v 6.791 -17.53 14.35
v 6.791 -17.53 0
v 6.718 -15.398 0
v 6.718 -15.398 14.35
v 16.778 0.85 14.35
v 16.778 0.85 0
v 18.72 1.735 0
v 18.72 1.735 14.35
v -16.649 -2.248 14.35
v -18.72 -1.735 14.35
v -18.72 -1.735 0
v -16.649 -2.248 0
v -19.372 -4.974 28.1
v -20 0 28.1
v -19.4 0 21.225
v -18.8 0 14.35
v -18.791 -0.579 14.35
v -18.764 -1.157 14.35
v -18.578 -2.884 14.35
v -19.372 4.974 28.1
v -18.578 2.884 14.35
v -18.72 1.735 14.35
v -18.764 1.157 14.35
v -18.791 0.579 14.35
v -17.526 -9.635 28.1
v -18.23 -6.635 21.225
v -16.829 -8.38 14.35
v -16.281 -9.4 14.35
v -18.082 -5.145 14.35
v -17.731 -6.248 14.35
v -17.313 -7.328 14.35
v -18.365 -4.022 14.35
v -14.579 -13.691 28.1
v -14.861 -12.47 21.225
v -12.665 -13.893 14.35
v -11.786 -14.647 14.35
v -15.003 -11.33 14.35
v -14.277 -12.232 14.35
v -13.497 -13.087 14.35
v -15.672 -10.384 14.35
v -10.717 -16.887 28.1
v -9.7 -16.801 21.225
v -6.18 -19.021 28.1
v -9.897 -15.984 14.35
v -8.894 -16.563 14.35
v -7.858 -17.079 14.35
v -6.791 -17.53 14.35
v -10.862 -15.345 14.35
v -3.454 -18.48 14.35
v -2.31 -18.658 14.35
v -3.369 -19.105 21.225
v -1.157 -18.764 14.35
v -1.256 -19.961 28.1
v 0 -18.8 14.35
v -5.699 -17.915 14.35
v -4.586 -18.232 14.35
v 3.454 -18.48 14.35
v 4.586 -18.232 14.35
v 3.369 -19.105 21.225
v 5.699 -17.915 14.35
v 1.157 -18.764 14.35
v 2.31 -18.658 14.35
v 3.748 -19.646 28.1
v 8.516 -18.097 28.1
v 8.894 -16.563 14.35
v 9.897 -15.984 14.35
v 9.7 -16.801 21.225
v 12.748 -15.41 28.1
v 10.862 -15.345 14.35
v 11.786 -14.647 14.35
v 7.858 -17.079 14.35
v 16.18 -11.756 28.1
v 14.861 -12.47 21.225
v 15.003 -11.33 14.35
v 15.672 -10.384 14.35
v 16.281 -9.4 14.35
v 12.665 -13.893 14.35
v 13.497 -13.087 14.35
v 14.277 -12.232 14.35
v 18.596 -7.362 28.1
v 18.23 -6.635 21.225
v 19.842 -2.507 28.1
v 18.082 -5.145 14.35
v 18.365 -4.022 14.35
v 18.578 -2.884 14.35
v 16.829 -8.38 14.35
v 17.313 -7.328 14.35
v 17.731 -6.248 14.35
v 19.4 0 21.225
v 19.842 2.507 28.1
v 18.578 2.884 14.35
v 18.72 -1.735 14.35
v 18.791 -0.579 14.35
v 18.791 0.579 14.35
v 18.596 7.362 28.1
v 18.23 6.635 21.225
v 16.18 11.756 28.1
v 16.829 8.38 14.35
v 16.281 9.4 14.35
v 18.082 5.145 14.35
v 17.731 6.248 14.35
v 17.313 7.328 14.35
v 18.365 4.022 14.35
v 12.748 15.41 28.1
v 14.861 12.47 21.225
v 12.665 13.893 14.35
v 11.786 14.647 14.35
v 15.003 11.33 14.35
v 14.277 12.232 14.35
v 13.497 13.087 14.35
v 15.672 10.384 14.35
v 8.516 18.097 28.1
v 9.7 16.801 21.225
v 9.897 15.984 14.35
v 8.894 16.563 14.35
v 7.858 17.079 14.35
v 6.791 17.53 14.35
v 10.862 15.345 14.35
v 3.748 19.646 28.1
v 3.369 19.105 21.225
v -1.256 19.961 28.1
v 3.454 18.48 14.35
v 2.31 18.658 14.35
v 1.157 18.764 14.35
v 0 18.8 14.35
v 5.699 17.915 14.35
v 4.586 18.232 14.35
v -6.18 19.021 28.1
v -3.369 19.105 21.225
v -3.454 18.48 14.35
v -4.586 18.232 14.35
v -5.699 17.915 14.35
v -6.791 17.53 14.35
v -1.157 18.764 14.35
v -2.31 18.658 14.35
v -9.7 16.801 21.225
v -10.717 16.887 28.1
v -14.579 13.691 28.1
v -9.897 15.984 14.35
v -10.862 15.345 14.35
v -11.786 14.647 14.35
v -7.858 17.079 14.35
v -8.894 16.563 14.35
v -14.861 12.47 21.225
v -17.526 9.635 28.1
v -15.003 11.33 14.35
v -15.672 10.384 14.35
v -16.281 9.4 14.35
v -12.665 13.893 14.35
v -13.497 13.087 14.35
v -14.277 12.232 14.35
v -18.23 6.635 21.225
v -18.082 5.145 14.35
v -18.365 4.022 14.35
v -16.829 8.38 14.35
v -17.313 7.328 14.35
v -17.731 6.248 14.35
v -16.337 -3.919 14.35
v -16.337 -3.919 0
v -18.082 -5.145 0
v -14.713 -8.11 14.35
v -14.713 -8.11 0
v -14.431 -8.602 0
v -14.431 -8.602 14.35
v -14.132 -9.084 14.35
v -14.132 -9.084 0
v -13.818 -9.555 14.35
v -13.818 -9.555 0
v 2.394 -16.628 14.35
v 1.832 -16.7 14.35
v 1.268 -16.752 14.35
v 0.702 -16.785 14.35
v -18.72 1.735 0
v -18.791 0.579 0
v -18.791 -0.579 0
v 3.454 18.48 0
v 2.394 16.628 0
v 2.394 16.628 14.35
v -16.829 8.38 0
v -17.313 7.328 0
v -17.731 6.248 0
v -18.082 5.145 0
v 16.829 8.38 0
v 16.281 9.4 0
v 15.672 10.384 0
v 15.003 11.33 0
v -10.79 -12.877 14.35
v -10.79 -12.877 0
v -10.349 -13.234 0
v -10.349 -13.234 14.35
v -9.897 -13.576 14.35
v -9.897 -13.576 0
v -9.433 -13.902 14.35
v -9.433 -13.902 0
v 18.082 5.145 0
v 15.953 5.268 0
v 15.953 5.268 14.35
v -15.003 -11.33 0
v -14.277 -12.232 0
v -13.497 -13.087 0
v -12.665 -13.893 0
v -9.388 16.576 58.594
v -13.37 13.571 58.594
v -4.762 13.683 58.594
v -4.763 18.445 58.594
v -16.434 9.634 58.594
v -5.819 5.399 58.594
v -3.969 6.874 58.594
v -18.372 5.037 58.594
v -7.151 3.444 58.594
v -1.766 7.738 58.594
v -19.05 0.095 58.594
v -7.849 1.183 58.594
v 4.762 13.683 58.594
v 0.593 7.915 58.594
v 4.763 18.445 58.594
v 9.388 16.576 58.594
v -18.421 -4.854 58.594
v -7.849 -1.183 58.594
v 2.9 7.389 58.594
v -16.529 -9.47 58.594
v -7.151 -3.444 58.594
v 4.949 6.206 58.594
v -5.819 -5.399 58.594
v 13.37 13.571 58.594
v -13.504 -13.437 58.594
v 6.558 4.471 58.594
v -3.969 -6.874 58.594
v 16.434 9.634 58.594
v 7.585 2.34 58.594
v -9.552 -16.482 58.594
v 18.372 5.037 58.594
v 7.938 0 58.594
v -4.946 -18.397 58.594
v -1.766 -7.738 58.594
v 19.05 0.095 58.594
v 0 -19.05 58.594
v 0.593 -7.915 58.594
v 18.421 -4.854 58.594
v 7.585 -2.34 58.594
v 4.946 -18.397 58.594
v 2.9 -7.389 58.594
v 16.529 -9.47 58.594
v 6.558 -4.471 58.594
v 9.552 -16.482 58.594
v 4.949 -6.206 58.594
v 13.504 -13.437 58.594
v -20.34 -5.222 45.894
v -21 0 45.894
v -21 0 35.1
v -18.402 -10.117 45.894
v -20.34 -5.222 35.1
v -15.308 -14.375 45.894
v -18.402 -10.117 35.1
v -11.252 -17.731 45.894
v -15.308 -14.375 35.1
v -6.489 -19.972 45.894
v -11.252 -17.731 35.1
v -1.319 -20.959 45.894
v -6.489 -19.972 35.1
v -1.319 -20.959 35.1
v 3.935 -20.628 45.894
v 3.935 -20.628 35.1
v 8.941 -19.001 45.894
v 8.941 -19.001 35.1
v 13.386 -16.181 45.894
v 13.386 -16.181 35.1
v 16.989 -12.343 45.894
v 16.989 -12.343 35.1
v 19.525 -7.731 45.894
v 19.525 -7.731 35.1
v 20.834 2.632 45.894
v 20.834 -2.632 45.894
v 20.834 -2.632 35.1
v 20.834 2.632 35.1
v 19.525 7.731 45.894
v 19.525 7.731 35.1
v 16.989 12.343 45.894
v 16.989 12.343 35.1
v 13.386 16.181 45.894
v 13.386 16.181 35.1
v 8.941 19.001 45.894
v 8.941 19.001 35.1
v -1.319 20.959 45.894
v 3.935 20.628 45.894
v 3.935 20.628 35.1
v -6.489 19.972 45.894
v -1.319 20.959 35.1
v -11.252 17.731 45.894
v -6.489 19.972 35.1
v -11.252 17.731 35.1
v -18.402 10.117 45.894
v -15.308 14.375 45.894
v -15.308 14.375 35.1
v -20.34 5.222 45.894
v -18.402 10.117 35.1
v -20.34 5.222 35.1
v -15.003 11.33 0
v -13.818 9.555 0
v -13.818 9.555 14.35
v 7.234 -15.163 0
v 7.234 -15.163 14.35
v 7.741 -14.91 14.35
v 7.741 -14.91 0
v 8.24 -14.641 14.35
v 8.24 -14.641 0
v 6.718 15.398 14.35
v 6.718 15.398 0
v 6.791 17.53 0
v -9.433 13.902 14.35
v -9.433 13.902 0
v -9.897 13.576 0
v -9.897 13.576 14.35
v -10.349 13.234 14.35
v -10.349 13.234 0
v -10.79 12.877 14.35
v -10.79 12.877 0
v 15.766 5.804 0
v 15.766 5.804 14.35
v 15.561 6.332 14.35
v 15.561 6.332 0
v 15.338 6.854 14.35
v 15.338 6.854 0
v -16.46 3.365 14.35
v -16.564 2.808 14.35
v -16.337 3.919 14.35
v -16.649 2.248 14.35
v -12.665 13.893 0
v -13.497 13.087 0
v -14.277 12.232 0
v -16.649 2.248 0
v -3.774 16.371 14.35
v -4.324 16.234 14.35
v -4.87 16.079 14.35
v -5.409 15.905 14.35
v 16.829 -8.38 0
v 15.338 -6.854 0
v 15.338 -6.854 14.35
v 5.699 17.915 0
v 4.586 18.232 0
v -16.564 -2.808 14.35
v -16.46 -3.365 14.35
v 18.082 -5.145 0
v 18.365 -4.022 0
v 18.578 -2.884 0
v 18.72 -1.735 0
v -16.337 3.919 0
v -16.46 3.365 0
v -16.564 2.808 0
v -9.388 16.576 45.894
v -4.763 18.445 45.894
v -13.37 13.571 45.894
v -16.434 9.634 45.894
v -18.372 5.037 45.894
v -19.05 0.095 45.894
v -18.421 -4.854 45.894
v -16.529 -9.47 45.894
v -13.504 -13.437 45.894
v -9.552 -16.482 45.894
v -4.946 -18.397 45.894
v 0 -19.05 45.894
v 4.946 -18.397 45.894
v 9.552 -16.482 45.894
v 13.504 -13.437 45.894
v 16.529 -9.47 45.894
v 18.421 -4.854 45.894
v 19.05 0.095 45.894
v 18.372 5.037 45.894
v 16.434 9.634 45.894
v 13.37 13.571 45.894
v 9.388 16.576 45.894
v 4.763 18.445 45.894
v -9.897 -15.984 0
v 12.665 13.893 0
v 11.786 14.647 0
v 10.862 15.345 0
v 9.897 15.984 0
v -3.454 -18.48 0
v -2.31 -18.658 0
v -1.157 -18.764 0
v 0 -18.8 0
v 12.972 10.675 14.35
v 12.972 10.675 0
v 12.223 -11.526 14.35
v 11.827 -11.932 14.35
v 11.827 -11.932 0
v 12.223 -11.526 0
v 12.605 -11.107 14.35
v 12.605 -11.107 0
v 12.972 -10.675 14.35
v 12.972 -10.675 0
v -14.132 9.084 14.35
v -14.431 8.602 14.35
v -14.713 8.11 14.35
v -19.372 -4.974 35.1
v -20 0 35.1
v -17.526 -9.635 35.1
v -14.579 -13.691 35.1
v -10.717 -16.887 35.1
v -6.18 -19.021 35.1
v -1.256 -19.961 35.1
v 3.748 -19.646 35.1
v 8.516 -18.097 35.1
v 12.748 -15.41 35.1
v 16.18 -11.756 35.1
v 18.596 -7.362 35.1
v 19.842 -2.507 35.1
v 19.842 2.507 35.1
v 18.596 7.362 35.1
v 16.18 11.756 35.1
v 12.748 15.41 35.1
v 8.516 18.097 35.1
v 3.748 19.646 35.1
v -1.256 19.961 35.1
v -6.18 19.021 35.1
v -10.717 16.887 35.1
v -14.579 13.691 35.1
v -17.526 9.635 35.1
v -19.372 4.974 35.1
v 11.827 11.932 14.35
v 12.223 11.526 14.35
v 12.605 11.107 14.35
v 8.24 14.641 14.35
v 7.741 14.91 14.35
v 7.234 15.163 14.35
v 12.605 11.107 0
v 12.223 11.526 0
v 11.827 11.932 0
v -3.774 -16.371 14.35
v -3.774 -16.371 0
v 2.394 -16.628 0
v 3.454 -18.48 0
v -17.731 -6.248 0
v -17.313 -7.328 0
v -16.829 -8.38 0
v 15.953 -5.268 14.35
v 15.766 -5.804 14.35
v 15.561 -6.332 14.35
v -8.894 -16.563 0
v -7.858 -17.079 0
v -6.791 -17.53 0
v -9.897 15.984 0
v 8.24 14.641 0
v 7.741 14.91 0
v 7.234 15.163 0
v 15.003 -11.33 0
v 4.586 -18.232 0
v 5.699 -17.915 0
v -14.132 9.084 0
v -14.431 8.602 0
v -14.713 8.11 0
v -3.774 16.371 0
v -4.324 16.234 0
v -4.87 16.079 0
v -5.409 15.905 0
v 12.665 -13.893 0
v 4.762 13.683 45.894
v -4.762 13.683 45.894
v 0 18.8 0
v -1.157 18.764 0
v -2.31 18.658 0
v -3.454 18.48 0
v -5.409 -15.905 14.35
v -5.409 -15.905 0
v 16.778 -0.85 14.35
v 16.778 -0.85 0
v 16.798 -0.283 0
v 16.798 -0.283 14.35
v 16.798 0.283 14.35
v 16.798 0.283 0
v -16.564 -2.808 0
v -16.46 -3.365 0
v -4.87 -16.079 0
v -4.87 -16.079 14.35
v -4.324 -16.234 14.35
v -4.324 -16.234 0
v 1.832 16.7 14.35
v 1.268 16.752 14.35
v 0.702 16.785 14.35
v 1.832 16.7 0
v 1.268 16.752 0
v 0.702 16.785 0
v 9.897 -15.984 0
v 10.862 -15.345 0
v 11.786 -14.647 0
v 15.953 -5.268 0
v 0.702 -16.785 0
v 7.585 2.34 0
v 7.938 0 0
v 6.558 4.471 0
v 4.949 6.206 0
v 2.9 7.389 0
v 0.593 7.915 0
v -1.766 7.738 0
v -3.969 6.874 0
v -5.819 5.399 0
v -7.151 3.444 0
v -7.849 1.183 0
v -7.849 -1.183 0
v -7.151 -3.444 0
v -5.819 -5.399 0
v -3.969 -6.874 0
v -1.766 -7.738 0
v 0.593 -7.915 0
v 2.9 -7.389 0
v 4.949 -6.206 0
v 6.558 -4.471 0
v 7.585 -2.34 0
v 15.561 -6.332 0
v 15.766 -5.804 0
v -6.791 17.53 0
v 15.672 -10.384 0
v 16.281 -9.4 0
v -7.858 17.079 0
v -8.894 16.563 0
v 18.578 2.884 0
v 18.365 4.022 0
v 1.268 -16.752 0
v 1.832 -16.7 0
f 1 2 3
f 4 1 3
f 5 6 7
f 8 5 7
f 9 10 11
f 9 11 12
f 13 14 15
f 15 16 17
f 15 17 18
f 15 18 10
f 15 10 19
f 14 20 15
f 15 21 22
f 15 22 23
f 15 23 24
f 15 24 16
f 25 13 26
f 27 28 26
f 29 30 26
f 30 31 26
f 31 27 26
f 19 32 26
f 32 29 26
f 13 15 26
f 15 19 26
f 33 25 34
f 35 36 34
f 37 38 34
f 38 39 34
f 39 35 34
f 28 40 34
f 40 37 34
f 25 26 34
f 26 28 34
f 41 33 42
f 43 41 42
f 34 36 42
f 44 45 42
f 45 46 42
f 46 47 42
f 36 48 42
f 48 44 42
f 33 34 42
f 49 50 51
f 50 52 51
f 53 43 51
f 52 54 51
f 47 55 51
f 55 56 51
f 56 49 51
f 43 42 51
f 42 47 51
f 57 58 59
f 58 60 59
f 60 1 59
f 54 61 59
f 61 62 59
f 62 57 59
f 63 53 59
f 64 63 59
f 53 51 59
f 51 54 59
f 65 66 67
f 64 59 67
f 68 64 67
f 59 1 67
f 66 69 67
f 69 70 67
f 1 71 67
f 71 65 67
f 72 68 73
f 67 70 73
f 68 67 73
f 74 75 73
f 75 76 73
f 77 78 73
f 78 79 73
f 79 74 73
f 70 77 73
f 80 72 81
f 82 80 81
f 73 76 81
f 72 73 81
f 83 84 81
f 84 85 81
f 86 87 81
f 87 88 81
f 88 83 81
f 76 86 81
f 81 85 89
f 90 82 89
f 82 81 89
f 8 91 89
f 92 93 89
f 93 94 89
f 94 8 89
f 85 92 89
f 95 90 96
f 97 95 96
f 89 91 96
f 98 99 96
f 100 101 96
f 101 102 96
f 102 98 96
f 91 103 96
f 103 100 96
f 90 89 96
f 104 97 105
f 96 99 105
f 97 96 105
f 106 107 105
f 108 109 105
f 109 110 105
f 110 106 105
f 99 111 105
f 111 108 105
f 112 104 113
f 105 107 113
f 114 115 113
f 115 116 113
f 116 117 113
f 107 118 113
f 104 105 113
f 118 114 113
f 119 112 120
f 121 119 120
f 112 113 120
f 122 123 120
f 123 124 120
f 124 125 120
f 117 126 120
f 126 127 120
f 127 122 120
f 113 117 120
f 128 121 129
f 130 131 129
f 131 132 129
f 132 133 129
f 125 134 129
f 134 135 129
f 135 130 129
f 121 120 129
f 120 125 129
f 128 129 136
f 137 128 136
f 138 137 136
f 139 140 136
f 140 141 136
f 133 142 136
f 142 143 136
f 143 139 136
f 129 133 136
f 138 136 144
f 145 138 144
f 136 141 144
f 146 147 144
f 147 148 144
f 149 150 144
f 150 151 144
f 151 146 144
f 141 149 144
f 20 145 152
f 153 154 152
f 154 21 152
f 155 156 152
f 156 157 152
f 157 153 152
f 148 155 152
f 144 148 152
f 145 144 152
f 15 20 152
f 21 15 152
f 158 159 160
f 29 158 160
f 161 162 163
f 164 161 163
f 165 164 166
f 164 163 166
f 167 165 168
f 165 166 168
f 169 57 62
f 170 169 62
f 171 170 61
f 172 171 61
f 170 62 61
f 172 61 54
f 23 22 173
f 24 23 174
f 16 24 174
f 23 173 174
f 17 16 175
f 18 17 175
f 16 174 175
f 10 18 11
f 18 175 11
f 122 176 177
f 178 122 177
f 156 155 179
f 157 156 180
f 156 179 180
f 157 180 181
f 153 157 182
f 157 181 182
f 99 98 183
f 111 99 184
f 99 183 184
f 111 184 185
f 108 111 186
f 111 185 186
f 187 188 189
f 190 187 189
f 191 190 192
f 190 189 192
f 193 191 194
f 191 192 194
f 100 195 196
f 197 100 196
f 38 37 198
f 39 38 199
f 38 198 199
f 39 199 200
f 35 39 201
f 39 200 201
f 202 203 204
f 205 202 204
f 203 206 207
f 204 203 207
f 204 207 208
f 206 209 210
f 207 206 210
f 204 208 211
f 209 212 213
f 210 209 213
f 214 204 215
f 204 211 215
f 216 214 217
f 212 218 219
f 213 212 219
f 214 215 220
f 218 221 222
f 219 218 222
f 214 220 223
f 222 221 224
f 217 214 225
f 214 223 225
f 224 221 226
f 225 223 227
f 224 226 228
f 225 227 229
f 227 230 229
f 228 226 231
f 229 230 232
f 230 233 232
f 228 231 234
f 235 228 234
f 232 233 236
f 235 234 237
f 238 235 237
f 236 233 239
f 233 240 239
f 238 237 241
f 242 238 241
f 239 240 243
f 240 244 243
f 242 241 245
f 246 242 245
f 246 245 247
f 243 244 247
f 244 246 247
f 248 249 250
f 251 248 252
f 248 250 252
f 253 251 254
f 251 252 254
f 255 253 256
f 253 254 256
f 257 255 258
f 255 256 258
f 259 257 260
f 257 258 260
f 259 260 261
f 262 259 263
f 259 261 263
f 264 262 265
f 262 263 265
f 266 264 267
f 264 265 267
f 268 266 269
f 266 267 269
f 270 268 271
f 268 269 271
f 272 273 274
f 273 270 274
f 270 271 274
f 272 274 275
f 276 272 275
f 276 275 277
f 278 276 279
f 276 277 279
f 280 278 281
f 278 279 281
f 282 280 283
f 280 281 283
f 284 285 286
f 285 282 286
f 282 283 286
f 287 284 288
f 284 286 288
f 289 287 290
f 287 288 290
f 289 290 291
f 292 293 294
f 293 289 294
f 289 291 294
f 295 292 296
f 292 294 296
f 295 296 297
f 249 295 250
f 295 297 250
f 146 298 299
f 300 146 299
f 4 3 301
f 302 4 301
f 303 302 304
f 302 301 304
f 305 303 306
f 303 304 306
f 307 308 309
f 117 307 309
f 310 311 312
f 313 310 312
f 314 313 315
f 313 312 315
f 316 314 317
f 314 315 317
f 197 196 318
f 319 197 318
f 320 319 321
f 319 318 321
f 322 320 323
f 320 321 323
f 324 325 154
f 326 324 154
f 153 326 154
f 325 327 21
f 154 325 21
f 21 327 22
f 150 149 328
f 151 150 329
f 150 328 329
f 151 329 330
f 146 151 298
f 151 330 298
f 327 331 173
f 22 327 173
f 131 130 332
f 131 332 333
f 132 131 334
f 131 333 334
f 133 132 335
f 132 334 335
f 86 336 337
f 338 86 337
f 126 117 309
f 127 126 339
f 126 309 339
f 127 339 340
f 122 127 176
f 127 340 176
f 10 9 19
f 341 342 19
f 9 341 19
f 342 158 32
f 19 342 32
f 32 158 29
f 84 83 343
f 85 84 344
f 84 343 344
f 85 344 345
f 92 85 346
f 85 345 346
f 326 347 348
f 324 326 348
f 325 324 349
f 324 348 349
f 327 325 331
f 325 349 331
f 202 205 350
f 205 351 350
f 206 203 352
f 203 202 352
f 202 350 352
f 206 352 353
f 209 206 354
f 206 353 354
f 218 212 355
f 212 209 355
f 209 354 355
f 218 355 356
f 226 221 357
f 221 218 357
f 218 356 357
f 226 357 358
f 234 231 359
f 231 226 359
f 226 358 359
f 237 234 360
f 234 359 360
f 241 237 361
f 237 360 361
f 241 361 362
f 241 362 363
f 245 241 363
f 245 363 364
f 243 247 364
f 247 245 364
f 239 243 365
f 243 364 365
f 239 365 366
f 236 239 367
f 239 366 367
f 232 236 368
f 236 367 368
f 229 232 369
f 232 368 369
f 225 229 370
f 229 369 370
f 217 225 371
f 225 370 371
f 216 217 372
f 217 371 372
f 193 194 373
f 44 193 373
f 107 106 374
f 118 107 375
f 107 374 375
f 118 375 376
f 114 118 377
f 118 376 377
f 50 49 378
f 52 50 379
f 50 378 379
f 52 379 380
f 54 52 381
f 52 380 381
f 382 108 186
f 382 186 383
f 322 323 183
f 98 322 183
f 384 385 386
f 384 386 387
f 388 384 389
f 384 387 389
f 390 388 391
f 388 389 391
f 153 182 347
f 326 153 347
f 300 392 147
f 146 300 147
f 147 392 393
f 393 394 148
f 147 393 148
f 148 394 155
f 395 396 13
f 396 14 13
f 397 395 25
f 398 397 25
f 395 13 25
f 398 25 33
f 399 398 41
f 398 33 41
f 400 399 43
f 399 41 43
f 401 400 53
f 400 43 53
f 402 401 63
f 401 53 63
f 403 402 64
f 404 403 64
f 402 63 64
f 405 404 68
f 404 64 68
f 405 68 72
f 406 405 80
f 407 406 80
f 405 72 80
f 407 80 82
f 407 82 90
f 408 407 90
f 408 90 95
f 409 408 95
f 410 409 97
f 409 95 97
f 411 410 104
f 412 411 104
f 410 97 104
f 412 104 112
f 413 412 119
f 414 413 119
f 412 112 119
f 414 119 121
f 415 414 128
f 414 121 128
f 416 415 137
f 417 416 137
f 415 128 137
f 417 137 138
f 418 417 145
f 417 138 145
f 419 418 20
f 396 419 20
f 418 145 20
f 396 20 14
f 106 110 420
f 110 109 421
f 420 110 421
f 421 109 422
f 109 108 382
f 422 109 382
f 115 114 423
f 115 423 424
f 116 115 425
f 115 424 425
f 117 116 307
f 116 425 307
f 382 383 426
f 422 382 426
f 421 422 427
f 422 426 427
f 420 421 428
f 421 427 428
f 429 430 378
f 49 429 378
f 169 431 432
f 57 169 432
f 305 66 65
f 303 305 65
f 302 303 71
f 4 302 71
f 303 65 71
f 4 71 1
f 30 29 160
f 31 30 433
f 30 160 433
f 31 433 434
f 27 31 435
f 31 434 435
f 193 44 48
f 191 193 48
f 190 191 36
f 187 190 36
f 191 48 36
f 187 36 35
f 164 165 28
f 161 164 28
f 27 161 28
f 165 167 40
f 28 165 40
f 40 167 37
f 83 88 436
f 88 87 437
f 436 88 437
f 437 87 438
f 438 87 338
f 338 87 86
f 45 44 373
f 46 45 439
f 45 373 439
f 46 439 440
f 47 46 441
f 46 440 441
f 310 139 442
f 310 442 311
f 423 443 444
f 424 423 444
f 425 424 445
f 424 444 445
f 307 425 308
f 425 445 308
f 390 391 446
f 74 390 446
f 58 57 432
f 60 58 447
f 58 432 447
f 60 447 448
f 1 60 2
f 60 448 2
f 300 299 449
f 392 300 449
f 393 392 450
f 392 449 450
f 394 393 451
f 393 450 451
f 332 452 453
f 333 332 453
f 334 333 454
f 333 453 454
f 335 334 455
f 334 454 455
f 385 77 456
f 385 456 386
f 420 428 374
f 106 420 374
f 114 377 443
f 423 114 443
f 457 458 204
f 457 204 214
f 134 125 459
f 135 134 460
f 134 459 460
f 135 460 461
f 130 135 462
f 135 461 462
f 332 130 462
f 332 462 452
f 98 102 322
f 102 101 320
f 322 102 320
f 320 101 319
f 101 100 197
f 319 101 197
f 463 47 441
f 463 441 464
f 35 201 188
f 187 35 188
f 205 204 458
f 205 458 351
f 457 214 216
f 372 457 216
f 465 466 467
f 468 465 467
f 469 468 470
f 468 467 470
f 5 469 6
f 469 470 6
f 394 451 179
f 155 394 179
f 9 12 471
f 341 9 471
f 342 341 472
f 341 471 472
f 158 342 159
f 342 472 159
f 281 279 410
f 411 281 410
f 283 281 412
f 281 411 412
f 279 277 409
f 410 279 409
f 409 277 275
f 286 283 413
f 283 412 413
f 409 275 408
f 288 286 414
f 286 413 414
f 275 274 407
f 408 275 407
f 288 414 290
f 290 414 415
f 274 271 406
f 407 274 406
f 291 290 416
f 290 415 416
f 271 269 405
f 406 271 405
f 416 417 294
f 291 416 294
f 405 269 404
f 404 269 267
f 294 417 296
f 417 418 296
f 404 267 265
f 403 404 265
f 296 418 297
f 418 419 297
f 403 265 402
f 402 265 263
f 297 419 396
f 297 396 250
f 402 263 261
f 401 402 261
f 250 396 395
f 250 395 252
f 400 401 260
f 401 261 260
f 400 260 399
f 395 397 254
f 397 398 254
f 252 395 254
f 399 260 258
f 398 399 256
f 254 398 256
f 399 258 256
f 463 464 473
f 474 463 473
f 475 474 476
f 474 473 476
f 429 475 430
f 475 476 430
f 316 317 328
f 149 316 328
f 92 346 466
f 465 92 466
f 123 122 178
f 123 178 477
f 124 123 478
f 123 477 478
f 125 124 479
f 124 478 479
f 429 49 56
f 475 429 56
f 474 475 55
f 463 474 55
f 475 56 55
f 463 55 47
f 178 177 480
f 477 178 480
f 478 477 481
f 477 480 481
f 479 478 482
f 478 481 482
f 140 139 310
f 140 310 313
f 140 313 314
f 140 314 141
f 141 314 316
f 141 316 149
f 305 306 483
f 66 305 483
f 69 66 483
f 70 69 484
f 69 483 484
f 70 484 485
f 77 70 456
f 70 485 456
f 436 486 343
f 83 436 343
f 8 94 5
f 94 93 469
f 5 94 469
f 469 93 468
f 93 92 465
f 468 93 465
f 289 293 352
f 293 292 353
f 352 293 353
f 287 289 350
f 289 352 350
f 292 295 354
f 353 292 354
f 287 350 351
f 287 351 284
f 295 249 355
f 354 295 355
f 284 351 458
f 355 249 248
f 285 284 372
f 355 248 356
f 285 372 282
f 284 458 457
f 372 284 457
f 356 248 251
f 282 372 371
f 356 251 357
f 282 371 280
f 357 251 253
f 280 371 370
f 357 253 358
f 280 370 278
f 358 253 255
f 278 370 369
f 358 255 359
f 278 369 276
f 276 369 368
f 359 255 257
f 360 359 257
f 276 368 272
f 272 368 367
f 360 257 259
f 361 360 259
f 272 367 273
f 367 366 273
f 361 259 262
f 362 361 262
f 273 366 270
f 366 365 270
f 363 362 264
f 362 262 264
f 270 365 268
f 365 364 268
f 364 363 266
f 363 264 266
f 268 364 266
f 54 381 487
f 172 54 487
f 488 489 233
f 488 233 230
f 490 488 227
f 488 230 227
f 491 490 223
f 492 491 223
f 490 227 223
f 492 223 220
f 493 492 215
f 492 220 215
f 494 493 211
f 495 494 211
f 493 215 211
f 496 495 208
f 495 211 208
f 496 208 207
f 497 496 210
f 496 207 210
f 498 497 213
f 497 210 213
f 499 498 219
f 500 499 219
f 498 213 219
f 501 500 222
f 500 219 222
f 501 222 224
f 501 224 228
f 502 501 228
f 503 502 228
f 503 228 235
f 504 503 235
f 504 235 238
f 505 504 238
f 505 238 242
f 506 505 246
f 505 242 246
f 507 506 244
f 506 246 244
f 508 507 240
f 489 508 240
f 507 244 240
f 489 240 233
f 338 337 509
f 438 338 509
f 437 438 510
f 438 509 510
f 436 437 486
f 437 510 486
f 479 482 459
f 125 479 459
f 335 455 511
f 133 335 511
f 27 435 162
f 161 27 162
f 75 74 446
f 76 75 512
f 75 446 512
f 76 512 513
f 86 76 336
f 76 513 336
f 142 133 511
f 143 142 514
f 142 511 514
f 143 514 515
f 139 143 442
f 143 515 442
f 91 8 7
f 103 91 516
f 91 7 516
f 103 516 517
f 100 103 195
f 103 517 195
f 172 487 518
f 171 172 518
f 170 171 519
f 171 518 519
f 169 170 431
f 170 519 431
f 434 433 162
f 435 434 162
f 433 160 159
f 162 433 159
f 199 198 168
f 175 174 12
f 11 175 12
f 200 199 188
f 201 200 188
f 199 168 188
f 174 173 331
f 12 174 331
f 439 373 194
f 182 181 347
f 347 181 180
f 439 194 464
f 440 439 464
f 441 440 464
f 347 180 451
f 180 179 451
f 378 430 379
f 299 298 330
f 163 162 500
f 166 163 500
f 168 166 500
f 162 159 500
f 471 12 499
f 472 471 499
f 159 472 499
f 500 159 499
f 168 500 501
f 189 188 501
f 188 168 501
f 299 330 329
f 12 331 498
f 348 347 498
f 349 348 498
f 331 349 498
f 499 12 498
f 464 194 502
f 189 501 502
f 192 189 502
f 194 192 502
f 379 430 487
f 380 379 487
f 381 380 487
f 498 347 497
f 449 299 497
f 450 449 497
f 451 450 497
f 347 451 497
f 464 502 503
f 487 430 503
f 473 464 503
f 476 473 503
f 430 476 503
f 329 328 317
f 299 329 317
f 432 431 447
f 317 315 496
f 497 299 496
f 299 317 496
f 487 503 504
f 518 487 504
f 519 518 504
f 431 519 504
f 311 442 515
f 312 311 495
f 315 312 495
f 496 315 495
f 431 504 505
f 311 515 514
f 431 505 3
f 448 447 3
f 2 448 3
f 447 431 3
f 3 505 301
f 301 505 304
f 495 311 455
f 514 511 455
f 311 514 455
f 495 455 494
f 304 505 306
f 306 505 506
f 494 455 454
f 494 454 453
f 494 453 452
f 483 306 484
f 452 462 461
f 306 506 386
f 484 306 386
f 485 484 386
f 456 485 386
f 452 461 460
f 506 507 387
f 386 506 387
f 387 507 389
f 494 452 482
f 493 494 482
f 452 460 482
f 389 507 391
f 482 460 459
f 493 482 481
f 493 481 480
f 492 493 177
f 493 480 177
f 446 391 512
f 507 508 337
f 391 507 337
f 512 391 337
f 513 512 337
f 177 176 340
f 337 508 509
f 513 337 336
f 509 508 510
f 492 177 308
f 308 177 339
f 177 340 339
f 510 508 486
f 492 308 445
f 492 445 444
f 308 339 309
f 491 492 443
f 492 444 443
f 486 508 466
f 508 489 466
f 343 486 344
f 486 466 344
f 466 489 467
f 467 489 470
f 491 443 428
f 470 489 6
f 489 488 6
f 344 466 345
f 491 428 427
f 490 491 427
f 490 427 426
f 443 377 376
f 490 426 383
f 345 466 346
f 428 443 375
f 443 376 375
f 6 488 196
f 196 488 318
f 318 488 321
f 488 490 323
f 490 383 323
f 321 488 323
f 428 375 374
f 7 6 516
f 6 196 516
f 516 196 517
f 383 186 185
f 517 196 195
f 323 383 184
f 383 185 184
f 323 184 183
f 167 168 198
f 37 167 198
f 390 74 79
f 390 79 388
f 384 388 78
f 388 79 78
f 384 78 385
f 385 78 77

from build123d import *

# Parameters (mm, degrees)
BOSS_EXTRUDE1_DEPTH = 27.94
CIRPATTERN1_COUNT   = 17
SKETCH5_R           = 7.9375
SKETCH5_W           = 9.525
SKETCH5_H           = 11.576298251
CUT_EXTRUDE1_DEPTH  = 12.7
SKETCH5_2_R         = 7.9375
CUT_EXTRUDE2_DEPTH  = 70


with BuildPart() as part:
    # Sketch2 → Revolve1 (revolve)
    with BuildSketch(Plane(origin=(0, 0, 0), x_dir=(1, 0, 0), z_dir=(0, 1, 0))):
        Polygon((0, -14.35), (0, -58.593750066), (-19.05, -58.593750066), (-19.05, -45.893750066), (-21, -45.893750066), (-21, -35.1), (-20, -35.1), (-20, -28.1), (-18.8, -14.35), align=None)
    revolve(axis=Axis((0, 0, 14.35), (0, 0, 1)))

    # Sketch4 → Boss-Extrude1 (add)
    with BuildSketch(Plane.XY):
        with BuildLine():
            Line((-3.454490935, 18.479894274), (-3.774098097, 16.37058898))
            ThreePointArc((-3.774098097, 16.37058898), (-4.597538233, 16.158670805), (-5.40920169, 15.905361897))
            Line((-5.40920169, 15.905361897), (-6.791343324, 17.530477913))
            Line((-6.791343324, 17.530477913), (0, 0))
            Line((0, 0), (0, 18.8))
            ThreePointArc((0, 18.8), (-1.734645158, 18.719802514), (-3.454490935, 18.479894274))
        make_face()
    boss_extrude1 = extrude(amount=BOSS_EXTRUDE1_DEPTH)

    # CirPattern1: Boss-Extrude1 ×17 about axis
    cirpattern1_axis = Axis((0, 0, 27.94), (0, 0, -1))
    for i in range(1, CIRPATTERN1_COUNT):
        add(boss_extrude1.rotate(cirpattern1_axis, i * 360 / CIRPATTERN1_COUNT))

    # Sketch5 → Cut-Extrude1 (cut)
    with BuildSketch(Plane.XY.offset(58.593750066)):
        Circle(SKETCH5_R)
        with Locations((0, 19.470732312)):
            Rectangle(SKETCH5_W, SKETCH5_H)
    extrude(amount=-CUT_EXTRUDE1_DEPTH, mode=Mode.SUBTRACT)

    # Sketch5<2> → Cut-Extrude2 (cut)
    with BuildSketch(Plane.XY.offset(58.593750066)):
        Circle(SKETCH5_2_R)
    extrude(amount=-CUT_EXTRUDE2_DEPTH, mode=Mode.SUBTRACT)


solid = part.part
